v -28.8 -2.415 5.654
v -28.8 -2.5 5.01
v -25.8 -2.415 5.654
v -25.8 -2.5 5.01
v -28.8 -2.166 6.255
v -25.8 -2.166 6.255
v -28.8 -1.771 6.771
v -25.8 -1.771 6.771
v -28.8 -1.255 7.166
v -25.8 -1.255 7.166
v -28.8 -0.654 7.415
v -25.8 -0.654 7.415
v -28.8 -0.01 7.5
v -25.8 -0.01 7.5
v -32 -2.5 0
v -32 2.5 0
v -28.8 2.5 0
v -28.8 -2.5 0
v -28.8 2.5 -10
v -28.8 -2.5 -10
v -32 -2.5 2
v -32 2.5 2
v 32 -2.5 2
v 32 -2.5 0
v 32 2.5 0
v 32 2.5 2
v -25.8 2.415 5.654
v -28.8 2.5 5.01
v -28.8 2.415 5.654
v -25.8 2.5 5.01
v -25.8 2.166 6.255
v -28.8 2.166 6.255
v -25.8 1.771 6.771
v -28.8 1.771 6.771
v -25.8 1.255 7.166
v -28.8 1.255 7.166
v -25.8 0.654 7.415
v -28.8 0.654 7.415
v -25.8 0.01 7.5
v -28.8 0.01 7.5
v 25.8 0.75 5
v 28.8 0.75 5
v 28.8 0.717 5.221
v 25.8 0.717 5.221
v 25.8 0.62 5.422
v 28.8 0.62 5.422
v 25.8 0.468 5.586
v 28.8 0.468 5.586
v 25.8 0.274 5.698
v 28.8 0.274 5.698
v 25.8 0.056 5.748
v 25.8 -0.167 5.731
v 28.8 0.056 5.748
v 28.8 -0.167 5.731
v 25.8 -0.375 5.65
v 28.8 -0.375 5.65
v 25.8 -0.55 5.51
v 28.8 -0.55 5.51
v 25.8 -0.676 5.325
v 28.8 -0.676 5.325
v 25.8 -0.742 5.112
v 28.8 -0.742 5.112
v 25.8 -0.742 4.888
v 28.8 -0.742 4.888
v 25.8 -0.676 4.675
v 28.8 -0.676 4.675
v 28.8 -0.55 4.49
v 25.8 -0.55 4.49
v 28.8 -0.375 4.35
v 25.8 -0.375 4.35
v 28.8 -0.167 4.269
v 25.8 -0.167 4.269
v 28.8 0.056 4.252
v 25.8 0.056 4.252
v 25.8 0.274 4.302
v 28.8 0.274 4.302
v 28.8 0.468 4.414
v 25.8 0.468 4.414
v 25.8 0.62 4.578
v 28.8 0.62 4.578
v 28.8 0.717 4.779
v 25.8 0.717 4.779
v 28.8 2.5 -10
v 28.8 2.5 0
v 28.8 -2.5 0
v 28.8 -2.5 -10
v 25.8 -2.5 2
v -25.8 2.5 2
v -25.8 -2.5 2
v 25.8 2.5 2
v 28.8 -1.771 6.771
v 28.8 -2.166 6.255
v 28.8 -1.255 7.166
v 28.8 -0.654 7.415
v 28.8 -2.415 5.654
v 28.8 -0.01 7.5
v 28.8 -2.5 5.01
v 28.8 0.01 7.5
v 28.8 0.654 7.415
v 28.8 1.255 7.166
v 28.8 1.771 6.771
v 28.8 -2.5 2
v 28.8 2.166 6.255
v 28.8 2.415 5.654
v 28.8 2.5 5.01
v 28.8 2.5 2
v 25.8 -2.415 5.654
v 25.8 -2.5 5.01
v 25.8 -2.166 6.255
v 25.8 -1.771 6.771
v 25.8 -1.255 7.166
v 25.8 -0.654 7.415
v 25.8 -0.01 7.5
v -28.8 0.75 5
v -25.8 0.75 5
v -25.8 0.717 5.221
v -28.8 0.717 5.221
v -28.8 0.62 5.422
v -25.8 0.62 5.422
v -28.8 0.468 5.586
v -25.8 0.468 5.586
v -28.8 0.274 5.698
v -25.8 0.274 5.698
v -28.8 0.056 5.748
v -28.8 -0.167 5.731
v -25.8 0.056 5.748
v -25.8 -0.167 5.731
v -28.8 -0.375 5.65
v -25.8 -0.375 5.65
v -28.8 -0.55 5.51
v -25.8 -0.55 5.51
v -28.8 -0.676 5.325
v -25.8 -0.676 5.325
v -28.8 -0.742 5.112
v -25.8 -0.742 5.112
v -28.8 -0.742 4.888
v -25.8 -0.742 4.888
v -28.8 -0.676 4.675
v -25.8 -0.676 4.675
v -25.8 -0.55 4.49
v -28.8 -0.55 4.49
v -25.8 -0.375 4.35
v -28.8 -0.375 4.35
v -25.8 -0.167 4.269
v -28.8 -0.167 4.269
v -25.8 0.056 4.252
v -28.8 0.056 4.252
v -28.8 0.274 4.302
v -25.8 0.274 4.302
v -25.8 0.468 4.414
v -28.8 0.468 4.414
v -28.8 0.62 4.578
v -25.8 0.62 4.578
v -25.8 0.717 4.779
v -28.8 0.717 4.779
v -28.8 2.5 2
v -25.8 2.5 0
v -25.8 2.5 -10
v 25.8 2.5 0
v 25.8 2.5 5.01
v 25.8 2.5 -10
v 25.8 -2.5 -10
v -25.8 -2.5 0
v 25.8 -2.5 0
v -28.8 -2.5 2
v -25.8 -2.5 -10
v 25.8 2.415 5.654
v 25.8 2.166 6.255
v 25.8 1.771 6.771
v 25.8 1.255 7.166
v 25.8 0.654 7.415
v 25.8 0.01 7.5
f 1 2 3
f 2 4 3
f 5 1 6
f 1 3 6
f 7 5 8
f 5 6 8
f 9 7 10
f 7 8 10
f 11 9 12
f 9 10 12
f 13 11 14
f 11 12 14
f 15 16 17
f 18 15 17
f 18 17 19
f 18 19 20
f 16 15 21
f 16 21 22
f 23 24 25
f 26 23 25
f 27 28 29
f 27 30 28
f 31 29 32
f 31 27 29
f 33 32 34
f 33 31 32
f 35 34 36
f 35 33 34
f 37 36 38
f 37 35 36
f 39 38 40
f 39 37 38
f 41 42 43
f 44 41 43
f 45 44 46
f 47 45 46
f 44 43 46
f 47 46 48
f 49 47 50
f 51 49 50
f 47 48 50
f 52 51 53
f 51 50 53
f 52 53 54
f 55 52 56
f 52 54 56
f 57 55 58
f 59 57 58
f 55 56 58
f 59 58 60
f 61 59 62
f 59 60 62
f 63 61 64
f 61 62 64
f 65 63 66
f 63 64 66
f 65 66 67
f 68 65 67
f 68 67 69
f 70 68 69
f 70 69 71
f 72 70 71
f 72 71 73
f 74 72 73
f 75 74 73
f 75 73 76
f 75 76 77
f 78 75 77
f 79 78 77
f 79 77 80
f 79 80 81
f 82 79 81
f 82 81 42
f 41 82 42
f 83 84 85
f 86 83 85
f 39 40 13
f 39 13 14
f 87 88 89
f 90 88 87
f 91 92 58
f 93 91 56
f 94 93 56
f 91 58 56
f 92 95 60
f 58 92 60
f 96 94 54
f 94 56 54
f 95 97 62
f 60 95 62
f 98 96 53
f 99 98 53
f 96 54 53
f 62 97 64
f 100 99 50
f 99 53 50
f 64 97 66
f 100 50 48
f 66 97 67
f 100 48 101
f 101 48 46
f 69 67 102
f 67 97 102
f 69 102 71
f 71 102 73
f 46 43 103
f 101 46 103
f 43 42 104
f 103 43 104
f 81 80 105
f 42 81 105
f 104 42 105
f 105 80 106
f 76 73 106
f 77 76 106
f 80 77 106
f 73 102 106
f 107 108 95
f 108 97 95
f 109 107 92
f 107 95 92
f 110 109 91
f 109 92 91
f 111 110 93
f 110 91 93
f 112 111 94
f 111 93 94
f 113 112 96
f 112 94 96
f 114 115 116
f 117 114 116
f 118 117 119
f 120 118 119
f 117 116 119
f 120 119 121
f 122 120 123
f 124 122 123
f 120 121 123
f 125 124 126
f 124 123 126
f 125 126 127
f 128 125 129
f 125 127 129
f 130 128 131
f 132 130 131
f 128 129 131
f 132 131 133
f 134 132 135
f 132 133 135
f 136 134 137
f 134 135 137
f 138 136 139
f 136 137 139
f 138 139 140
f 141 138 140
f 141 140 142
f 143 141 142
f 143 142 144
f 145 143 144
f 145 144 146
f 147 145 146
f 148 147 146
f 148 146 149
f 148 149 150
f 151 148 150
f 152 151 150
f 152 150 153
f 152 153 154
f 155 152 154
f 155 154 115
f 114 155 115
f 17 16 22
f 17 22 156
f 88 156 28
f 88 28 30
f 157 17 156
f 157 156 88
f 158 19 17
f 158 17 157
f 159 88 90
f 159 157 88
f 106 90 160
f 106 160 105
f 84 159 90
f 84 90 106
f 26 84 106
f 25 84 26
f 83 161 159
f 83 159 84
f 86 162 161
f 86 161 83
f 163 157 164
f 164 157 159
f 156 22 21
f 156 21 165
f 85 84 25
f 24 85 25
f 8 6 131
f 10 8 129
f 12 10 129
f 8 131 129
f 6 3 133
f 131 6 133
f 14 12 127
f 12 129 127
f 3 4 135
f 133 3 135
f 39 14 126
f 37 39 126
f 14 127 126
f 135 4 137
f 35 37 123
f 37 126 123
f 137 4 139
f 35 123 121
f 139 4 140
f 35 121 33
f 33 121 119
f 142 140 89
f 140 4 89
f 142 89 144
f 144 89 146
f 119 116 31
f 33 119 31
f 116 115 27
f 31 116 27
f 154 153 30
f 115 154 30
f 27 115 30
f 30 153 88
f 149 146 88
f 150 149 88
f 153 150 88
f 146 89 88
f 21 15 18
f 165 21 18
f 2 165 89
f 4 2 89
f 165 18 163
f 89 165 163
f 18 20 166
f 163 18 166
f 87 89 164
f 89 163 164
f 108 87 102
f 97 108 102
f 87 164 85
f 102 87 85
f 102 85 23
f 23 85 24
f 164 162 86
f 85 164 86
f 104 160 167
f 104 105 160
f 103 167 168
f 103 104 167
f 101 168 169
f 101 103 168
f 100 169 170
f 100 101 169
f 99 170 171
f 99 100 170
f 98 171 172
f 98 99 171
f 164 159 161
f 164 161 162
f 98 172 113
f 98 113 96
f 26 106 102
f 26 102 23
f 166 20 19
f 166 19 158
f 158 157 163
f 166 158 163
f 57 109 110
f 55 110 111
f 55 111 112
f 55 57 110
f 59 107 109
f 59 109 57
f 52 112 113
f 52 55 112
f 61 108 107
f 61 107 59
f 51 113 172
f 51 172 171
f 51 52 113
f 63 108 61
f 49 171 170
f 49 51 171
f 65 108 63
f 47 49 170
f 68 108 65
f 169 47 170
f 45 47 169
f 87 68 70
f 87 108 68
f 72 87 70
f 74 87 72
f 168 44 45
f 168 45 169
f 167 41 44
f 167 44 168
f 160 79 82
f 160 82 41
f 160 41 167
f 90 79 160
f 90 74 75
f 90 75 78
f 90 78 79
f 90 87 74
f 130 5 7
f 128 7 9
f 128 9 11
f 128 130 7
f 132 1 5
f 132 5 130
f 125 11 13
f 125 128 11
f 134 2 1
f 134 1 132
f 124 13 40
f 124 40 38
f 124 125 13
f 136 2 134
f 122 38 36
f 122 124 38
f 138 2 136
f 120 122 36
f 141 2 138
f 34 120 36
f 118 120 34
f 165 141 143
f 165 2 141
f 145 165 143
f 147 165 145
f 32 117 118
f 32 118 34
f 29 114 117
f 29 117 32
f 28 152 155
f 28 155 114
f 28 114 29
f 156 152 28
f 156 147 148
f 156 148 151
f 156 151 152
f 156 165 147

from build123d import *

# Parameters (mm, degrees)
SKETCH_W     = 64
SKETCH_H     = 5
PAD_DEPTH    = 2
SKETCH001_W  = 3
SKETCH001_H  = 5
PAD001_DEPTH = 5.5
SKETCH002_R  = 0.75
POCKET_DEPTH = 70
SKETCH003_W  = 3
SKETCH003_H  = 5
PAD002_DEPTH = 10
FILLET_R     = 2.49


with BuildPart() as part:
    # Sketch → Pad (new body)
    with BuildSketch(Plane.XY):
        Rectangle(SKETCH_W, SKETCH_H)
    extrude(amount=PAD_DEPTH)

    # Sketch001 (on Face6 of Pad) → Pad001 (join)
    with BuildSketch(Plane.XY.offset(2)):
        with Locations((-27.3, 0)):
            Rectangle(SKETCH001_W, SKETCH001_H)
        with Locations((27.3, 0)):
            Rectangle(SKETCH001_W, SKETCH001_H)
    extrude(amount=PAD001_DEPTH)

    # Sketch002 (on Face15 of Pad001) → Pocket (cut)
    with BuildSketch(Plane.YZ.offset(28.8)):
        with Locations((0, 5)):
            Circle(SKETCH002_R)
    extrude(amount=-POCKET_DEPTH, mode=Mode.SUBTRACT)

    # Sketch003 (on Face4 of Pocket) → Pad002 (join)
    with BuildSketch(Plane(origin=(0, 0, 0), x_dir=(1, 0, 0), z_dir=(0, 0, -1))):
        with Locations((-27.3, 0)):
            Rectangle(SKETCH003_W, SKETCH003_H)
        with Locations((27.3, 0)):
            Rectangle(SKETCH003_W, SKETCH003_H)
    extrude(amount=PAD002_DEPTH)

    # Fillet
    fillet_edges = [part.edges().sort_by_distance(p)[0] for p in [
        (27.3, -2.5, 7.5),
        (-27.3, -2.5, 7.5),
        (-27.3, 2.5, 7.5),
        (27.3, 2.5, 7.5),
    ]]
    fillet(fillet_edges, radius=FILLET_R)


solid = part.part
